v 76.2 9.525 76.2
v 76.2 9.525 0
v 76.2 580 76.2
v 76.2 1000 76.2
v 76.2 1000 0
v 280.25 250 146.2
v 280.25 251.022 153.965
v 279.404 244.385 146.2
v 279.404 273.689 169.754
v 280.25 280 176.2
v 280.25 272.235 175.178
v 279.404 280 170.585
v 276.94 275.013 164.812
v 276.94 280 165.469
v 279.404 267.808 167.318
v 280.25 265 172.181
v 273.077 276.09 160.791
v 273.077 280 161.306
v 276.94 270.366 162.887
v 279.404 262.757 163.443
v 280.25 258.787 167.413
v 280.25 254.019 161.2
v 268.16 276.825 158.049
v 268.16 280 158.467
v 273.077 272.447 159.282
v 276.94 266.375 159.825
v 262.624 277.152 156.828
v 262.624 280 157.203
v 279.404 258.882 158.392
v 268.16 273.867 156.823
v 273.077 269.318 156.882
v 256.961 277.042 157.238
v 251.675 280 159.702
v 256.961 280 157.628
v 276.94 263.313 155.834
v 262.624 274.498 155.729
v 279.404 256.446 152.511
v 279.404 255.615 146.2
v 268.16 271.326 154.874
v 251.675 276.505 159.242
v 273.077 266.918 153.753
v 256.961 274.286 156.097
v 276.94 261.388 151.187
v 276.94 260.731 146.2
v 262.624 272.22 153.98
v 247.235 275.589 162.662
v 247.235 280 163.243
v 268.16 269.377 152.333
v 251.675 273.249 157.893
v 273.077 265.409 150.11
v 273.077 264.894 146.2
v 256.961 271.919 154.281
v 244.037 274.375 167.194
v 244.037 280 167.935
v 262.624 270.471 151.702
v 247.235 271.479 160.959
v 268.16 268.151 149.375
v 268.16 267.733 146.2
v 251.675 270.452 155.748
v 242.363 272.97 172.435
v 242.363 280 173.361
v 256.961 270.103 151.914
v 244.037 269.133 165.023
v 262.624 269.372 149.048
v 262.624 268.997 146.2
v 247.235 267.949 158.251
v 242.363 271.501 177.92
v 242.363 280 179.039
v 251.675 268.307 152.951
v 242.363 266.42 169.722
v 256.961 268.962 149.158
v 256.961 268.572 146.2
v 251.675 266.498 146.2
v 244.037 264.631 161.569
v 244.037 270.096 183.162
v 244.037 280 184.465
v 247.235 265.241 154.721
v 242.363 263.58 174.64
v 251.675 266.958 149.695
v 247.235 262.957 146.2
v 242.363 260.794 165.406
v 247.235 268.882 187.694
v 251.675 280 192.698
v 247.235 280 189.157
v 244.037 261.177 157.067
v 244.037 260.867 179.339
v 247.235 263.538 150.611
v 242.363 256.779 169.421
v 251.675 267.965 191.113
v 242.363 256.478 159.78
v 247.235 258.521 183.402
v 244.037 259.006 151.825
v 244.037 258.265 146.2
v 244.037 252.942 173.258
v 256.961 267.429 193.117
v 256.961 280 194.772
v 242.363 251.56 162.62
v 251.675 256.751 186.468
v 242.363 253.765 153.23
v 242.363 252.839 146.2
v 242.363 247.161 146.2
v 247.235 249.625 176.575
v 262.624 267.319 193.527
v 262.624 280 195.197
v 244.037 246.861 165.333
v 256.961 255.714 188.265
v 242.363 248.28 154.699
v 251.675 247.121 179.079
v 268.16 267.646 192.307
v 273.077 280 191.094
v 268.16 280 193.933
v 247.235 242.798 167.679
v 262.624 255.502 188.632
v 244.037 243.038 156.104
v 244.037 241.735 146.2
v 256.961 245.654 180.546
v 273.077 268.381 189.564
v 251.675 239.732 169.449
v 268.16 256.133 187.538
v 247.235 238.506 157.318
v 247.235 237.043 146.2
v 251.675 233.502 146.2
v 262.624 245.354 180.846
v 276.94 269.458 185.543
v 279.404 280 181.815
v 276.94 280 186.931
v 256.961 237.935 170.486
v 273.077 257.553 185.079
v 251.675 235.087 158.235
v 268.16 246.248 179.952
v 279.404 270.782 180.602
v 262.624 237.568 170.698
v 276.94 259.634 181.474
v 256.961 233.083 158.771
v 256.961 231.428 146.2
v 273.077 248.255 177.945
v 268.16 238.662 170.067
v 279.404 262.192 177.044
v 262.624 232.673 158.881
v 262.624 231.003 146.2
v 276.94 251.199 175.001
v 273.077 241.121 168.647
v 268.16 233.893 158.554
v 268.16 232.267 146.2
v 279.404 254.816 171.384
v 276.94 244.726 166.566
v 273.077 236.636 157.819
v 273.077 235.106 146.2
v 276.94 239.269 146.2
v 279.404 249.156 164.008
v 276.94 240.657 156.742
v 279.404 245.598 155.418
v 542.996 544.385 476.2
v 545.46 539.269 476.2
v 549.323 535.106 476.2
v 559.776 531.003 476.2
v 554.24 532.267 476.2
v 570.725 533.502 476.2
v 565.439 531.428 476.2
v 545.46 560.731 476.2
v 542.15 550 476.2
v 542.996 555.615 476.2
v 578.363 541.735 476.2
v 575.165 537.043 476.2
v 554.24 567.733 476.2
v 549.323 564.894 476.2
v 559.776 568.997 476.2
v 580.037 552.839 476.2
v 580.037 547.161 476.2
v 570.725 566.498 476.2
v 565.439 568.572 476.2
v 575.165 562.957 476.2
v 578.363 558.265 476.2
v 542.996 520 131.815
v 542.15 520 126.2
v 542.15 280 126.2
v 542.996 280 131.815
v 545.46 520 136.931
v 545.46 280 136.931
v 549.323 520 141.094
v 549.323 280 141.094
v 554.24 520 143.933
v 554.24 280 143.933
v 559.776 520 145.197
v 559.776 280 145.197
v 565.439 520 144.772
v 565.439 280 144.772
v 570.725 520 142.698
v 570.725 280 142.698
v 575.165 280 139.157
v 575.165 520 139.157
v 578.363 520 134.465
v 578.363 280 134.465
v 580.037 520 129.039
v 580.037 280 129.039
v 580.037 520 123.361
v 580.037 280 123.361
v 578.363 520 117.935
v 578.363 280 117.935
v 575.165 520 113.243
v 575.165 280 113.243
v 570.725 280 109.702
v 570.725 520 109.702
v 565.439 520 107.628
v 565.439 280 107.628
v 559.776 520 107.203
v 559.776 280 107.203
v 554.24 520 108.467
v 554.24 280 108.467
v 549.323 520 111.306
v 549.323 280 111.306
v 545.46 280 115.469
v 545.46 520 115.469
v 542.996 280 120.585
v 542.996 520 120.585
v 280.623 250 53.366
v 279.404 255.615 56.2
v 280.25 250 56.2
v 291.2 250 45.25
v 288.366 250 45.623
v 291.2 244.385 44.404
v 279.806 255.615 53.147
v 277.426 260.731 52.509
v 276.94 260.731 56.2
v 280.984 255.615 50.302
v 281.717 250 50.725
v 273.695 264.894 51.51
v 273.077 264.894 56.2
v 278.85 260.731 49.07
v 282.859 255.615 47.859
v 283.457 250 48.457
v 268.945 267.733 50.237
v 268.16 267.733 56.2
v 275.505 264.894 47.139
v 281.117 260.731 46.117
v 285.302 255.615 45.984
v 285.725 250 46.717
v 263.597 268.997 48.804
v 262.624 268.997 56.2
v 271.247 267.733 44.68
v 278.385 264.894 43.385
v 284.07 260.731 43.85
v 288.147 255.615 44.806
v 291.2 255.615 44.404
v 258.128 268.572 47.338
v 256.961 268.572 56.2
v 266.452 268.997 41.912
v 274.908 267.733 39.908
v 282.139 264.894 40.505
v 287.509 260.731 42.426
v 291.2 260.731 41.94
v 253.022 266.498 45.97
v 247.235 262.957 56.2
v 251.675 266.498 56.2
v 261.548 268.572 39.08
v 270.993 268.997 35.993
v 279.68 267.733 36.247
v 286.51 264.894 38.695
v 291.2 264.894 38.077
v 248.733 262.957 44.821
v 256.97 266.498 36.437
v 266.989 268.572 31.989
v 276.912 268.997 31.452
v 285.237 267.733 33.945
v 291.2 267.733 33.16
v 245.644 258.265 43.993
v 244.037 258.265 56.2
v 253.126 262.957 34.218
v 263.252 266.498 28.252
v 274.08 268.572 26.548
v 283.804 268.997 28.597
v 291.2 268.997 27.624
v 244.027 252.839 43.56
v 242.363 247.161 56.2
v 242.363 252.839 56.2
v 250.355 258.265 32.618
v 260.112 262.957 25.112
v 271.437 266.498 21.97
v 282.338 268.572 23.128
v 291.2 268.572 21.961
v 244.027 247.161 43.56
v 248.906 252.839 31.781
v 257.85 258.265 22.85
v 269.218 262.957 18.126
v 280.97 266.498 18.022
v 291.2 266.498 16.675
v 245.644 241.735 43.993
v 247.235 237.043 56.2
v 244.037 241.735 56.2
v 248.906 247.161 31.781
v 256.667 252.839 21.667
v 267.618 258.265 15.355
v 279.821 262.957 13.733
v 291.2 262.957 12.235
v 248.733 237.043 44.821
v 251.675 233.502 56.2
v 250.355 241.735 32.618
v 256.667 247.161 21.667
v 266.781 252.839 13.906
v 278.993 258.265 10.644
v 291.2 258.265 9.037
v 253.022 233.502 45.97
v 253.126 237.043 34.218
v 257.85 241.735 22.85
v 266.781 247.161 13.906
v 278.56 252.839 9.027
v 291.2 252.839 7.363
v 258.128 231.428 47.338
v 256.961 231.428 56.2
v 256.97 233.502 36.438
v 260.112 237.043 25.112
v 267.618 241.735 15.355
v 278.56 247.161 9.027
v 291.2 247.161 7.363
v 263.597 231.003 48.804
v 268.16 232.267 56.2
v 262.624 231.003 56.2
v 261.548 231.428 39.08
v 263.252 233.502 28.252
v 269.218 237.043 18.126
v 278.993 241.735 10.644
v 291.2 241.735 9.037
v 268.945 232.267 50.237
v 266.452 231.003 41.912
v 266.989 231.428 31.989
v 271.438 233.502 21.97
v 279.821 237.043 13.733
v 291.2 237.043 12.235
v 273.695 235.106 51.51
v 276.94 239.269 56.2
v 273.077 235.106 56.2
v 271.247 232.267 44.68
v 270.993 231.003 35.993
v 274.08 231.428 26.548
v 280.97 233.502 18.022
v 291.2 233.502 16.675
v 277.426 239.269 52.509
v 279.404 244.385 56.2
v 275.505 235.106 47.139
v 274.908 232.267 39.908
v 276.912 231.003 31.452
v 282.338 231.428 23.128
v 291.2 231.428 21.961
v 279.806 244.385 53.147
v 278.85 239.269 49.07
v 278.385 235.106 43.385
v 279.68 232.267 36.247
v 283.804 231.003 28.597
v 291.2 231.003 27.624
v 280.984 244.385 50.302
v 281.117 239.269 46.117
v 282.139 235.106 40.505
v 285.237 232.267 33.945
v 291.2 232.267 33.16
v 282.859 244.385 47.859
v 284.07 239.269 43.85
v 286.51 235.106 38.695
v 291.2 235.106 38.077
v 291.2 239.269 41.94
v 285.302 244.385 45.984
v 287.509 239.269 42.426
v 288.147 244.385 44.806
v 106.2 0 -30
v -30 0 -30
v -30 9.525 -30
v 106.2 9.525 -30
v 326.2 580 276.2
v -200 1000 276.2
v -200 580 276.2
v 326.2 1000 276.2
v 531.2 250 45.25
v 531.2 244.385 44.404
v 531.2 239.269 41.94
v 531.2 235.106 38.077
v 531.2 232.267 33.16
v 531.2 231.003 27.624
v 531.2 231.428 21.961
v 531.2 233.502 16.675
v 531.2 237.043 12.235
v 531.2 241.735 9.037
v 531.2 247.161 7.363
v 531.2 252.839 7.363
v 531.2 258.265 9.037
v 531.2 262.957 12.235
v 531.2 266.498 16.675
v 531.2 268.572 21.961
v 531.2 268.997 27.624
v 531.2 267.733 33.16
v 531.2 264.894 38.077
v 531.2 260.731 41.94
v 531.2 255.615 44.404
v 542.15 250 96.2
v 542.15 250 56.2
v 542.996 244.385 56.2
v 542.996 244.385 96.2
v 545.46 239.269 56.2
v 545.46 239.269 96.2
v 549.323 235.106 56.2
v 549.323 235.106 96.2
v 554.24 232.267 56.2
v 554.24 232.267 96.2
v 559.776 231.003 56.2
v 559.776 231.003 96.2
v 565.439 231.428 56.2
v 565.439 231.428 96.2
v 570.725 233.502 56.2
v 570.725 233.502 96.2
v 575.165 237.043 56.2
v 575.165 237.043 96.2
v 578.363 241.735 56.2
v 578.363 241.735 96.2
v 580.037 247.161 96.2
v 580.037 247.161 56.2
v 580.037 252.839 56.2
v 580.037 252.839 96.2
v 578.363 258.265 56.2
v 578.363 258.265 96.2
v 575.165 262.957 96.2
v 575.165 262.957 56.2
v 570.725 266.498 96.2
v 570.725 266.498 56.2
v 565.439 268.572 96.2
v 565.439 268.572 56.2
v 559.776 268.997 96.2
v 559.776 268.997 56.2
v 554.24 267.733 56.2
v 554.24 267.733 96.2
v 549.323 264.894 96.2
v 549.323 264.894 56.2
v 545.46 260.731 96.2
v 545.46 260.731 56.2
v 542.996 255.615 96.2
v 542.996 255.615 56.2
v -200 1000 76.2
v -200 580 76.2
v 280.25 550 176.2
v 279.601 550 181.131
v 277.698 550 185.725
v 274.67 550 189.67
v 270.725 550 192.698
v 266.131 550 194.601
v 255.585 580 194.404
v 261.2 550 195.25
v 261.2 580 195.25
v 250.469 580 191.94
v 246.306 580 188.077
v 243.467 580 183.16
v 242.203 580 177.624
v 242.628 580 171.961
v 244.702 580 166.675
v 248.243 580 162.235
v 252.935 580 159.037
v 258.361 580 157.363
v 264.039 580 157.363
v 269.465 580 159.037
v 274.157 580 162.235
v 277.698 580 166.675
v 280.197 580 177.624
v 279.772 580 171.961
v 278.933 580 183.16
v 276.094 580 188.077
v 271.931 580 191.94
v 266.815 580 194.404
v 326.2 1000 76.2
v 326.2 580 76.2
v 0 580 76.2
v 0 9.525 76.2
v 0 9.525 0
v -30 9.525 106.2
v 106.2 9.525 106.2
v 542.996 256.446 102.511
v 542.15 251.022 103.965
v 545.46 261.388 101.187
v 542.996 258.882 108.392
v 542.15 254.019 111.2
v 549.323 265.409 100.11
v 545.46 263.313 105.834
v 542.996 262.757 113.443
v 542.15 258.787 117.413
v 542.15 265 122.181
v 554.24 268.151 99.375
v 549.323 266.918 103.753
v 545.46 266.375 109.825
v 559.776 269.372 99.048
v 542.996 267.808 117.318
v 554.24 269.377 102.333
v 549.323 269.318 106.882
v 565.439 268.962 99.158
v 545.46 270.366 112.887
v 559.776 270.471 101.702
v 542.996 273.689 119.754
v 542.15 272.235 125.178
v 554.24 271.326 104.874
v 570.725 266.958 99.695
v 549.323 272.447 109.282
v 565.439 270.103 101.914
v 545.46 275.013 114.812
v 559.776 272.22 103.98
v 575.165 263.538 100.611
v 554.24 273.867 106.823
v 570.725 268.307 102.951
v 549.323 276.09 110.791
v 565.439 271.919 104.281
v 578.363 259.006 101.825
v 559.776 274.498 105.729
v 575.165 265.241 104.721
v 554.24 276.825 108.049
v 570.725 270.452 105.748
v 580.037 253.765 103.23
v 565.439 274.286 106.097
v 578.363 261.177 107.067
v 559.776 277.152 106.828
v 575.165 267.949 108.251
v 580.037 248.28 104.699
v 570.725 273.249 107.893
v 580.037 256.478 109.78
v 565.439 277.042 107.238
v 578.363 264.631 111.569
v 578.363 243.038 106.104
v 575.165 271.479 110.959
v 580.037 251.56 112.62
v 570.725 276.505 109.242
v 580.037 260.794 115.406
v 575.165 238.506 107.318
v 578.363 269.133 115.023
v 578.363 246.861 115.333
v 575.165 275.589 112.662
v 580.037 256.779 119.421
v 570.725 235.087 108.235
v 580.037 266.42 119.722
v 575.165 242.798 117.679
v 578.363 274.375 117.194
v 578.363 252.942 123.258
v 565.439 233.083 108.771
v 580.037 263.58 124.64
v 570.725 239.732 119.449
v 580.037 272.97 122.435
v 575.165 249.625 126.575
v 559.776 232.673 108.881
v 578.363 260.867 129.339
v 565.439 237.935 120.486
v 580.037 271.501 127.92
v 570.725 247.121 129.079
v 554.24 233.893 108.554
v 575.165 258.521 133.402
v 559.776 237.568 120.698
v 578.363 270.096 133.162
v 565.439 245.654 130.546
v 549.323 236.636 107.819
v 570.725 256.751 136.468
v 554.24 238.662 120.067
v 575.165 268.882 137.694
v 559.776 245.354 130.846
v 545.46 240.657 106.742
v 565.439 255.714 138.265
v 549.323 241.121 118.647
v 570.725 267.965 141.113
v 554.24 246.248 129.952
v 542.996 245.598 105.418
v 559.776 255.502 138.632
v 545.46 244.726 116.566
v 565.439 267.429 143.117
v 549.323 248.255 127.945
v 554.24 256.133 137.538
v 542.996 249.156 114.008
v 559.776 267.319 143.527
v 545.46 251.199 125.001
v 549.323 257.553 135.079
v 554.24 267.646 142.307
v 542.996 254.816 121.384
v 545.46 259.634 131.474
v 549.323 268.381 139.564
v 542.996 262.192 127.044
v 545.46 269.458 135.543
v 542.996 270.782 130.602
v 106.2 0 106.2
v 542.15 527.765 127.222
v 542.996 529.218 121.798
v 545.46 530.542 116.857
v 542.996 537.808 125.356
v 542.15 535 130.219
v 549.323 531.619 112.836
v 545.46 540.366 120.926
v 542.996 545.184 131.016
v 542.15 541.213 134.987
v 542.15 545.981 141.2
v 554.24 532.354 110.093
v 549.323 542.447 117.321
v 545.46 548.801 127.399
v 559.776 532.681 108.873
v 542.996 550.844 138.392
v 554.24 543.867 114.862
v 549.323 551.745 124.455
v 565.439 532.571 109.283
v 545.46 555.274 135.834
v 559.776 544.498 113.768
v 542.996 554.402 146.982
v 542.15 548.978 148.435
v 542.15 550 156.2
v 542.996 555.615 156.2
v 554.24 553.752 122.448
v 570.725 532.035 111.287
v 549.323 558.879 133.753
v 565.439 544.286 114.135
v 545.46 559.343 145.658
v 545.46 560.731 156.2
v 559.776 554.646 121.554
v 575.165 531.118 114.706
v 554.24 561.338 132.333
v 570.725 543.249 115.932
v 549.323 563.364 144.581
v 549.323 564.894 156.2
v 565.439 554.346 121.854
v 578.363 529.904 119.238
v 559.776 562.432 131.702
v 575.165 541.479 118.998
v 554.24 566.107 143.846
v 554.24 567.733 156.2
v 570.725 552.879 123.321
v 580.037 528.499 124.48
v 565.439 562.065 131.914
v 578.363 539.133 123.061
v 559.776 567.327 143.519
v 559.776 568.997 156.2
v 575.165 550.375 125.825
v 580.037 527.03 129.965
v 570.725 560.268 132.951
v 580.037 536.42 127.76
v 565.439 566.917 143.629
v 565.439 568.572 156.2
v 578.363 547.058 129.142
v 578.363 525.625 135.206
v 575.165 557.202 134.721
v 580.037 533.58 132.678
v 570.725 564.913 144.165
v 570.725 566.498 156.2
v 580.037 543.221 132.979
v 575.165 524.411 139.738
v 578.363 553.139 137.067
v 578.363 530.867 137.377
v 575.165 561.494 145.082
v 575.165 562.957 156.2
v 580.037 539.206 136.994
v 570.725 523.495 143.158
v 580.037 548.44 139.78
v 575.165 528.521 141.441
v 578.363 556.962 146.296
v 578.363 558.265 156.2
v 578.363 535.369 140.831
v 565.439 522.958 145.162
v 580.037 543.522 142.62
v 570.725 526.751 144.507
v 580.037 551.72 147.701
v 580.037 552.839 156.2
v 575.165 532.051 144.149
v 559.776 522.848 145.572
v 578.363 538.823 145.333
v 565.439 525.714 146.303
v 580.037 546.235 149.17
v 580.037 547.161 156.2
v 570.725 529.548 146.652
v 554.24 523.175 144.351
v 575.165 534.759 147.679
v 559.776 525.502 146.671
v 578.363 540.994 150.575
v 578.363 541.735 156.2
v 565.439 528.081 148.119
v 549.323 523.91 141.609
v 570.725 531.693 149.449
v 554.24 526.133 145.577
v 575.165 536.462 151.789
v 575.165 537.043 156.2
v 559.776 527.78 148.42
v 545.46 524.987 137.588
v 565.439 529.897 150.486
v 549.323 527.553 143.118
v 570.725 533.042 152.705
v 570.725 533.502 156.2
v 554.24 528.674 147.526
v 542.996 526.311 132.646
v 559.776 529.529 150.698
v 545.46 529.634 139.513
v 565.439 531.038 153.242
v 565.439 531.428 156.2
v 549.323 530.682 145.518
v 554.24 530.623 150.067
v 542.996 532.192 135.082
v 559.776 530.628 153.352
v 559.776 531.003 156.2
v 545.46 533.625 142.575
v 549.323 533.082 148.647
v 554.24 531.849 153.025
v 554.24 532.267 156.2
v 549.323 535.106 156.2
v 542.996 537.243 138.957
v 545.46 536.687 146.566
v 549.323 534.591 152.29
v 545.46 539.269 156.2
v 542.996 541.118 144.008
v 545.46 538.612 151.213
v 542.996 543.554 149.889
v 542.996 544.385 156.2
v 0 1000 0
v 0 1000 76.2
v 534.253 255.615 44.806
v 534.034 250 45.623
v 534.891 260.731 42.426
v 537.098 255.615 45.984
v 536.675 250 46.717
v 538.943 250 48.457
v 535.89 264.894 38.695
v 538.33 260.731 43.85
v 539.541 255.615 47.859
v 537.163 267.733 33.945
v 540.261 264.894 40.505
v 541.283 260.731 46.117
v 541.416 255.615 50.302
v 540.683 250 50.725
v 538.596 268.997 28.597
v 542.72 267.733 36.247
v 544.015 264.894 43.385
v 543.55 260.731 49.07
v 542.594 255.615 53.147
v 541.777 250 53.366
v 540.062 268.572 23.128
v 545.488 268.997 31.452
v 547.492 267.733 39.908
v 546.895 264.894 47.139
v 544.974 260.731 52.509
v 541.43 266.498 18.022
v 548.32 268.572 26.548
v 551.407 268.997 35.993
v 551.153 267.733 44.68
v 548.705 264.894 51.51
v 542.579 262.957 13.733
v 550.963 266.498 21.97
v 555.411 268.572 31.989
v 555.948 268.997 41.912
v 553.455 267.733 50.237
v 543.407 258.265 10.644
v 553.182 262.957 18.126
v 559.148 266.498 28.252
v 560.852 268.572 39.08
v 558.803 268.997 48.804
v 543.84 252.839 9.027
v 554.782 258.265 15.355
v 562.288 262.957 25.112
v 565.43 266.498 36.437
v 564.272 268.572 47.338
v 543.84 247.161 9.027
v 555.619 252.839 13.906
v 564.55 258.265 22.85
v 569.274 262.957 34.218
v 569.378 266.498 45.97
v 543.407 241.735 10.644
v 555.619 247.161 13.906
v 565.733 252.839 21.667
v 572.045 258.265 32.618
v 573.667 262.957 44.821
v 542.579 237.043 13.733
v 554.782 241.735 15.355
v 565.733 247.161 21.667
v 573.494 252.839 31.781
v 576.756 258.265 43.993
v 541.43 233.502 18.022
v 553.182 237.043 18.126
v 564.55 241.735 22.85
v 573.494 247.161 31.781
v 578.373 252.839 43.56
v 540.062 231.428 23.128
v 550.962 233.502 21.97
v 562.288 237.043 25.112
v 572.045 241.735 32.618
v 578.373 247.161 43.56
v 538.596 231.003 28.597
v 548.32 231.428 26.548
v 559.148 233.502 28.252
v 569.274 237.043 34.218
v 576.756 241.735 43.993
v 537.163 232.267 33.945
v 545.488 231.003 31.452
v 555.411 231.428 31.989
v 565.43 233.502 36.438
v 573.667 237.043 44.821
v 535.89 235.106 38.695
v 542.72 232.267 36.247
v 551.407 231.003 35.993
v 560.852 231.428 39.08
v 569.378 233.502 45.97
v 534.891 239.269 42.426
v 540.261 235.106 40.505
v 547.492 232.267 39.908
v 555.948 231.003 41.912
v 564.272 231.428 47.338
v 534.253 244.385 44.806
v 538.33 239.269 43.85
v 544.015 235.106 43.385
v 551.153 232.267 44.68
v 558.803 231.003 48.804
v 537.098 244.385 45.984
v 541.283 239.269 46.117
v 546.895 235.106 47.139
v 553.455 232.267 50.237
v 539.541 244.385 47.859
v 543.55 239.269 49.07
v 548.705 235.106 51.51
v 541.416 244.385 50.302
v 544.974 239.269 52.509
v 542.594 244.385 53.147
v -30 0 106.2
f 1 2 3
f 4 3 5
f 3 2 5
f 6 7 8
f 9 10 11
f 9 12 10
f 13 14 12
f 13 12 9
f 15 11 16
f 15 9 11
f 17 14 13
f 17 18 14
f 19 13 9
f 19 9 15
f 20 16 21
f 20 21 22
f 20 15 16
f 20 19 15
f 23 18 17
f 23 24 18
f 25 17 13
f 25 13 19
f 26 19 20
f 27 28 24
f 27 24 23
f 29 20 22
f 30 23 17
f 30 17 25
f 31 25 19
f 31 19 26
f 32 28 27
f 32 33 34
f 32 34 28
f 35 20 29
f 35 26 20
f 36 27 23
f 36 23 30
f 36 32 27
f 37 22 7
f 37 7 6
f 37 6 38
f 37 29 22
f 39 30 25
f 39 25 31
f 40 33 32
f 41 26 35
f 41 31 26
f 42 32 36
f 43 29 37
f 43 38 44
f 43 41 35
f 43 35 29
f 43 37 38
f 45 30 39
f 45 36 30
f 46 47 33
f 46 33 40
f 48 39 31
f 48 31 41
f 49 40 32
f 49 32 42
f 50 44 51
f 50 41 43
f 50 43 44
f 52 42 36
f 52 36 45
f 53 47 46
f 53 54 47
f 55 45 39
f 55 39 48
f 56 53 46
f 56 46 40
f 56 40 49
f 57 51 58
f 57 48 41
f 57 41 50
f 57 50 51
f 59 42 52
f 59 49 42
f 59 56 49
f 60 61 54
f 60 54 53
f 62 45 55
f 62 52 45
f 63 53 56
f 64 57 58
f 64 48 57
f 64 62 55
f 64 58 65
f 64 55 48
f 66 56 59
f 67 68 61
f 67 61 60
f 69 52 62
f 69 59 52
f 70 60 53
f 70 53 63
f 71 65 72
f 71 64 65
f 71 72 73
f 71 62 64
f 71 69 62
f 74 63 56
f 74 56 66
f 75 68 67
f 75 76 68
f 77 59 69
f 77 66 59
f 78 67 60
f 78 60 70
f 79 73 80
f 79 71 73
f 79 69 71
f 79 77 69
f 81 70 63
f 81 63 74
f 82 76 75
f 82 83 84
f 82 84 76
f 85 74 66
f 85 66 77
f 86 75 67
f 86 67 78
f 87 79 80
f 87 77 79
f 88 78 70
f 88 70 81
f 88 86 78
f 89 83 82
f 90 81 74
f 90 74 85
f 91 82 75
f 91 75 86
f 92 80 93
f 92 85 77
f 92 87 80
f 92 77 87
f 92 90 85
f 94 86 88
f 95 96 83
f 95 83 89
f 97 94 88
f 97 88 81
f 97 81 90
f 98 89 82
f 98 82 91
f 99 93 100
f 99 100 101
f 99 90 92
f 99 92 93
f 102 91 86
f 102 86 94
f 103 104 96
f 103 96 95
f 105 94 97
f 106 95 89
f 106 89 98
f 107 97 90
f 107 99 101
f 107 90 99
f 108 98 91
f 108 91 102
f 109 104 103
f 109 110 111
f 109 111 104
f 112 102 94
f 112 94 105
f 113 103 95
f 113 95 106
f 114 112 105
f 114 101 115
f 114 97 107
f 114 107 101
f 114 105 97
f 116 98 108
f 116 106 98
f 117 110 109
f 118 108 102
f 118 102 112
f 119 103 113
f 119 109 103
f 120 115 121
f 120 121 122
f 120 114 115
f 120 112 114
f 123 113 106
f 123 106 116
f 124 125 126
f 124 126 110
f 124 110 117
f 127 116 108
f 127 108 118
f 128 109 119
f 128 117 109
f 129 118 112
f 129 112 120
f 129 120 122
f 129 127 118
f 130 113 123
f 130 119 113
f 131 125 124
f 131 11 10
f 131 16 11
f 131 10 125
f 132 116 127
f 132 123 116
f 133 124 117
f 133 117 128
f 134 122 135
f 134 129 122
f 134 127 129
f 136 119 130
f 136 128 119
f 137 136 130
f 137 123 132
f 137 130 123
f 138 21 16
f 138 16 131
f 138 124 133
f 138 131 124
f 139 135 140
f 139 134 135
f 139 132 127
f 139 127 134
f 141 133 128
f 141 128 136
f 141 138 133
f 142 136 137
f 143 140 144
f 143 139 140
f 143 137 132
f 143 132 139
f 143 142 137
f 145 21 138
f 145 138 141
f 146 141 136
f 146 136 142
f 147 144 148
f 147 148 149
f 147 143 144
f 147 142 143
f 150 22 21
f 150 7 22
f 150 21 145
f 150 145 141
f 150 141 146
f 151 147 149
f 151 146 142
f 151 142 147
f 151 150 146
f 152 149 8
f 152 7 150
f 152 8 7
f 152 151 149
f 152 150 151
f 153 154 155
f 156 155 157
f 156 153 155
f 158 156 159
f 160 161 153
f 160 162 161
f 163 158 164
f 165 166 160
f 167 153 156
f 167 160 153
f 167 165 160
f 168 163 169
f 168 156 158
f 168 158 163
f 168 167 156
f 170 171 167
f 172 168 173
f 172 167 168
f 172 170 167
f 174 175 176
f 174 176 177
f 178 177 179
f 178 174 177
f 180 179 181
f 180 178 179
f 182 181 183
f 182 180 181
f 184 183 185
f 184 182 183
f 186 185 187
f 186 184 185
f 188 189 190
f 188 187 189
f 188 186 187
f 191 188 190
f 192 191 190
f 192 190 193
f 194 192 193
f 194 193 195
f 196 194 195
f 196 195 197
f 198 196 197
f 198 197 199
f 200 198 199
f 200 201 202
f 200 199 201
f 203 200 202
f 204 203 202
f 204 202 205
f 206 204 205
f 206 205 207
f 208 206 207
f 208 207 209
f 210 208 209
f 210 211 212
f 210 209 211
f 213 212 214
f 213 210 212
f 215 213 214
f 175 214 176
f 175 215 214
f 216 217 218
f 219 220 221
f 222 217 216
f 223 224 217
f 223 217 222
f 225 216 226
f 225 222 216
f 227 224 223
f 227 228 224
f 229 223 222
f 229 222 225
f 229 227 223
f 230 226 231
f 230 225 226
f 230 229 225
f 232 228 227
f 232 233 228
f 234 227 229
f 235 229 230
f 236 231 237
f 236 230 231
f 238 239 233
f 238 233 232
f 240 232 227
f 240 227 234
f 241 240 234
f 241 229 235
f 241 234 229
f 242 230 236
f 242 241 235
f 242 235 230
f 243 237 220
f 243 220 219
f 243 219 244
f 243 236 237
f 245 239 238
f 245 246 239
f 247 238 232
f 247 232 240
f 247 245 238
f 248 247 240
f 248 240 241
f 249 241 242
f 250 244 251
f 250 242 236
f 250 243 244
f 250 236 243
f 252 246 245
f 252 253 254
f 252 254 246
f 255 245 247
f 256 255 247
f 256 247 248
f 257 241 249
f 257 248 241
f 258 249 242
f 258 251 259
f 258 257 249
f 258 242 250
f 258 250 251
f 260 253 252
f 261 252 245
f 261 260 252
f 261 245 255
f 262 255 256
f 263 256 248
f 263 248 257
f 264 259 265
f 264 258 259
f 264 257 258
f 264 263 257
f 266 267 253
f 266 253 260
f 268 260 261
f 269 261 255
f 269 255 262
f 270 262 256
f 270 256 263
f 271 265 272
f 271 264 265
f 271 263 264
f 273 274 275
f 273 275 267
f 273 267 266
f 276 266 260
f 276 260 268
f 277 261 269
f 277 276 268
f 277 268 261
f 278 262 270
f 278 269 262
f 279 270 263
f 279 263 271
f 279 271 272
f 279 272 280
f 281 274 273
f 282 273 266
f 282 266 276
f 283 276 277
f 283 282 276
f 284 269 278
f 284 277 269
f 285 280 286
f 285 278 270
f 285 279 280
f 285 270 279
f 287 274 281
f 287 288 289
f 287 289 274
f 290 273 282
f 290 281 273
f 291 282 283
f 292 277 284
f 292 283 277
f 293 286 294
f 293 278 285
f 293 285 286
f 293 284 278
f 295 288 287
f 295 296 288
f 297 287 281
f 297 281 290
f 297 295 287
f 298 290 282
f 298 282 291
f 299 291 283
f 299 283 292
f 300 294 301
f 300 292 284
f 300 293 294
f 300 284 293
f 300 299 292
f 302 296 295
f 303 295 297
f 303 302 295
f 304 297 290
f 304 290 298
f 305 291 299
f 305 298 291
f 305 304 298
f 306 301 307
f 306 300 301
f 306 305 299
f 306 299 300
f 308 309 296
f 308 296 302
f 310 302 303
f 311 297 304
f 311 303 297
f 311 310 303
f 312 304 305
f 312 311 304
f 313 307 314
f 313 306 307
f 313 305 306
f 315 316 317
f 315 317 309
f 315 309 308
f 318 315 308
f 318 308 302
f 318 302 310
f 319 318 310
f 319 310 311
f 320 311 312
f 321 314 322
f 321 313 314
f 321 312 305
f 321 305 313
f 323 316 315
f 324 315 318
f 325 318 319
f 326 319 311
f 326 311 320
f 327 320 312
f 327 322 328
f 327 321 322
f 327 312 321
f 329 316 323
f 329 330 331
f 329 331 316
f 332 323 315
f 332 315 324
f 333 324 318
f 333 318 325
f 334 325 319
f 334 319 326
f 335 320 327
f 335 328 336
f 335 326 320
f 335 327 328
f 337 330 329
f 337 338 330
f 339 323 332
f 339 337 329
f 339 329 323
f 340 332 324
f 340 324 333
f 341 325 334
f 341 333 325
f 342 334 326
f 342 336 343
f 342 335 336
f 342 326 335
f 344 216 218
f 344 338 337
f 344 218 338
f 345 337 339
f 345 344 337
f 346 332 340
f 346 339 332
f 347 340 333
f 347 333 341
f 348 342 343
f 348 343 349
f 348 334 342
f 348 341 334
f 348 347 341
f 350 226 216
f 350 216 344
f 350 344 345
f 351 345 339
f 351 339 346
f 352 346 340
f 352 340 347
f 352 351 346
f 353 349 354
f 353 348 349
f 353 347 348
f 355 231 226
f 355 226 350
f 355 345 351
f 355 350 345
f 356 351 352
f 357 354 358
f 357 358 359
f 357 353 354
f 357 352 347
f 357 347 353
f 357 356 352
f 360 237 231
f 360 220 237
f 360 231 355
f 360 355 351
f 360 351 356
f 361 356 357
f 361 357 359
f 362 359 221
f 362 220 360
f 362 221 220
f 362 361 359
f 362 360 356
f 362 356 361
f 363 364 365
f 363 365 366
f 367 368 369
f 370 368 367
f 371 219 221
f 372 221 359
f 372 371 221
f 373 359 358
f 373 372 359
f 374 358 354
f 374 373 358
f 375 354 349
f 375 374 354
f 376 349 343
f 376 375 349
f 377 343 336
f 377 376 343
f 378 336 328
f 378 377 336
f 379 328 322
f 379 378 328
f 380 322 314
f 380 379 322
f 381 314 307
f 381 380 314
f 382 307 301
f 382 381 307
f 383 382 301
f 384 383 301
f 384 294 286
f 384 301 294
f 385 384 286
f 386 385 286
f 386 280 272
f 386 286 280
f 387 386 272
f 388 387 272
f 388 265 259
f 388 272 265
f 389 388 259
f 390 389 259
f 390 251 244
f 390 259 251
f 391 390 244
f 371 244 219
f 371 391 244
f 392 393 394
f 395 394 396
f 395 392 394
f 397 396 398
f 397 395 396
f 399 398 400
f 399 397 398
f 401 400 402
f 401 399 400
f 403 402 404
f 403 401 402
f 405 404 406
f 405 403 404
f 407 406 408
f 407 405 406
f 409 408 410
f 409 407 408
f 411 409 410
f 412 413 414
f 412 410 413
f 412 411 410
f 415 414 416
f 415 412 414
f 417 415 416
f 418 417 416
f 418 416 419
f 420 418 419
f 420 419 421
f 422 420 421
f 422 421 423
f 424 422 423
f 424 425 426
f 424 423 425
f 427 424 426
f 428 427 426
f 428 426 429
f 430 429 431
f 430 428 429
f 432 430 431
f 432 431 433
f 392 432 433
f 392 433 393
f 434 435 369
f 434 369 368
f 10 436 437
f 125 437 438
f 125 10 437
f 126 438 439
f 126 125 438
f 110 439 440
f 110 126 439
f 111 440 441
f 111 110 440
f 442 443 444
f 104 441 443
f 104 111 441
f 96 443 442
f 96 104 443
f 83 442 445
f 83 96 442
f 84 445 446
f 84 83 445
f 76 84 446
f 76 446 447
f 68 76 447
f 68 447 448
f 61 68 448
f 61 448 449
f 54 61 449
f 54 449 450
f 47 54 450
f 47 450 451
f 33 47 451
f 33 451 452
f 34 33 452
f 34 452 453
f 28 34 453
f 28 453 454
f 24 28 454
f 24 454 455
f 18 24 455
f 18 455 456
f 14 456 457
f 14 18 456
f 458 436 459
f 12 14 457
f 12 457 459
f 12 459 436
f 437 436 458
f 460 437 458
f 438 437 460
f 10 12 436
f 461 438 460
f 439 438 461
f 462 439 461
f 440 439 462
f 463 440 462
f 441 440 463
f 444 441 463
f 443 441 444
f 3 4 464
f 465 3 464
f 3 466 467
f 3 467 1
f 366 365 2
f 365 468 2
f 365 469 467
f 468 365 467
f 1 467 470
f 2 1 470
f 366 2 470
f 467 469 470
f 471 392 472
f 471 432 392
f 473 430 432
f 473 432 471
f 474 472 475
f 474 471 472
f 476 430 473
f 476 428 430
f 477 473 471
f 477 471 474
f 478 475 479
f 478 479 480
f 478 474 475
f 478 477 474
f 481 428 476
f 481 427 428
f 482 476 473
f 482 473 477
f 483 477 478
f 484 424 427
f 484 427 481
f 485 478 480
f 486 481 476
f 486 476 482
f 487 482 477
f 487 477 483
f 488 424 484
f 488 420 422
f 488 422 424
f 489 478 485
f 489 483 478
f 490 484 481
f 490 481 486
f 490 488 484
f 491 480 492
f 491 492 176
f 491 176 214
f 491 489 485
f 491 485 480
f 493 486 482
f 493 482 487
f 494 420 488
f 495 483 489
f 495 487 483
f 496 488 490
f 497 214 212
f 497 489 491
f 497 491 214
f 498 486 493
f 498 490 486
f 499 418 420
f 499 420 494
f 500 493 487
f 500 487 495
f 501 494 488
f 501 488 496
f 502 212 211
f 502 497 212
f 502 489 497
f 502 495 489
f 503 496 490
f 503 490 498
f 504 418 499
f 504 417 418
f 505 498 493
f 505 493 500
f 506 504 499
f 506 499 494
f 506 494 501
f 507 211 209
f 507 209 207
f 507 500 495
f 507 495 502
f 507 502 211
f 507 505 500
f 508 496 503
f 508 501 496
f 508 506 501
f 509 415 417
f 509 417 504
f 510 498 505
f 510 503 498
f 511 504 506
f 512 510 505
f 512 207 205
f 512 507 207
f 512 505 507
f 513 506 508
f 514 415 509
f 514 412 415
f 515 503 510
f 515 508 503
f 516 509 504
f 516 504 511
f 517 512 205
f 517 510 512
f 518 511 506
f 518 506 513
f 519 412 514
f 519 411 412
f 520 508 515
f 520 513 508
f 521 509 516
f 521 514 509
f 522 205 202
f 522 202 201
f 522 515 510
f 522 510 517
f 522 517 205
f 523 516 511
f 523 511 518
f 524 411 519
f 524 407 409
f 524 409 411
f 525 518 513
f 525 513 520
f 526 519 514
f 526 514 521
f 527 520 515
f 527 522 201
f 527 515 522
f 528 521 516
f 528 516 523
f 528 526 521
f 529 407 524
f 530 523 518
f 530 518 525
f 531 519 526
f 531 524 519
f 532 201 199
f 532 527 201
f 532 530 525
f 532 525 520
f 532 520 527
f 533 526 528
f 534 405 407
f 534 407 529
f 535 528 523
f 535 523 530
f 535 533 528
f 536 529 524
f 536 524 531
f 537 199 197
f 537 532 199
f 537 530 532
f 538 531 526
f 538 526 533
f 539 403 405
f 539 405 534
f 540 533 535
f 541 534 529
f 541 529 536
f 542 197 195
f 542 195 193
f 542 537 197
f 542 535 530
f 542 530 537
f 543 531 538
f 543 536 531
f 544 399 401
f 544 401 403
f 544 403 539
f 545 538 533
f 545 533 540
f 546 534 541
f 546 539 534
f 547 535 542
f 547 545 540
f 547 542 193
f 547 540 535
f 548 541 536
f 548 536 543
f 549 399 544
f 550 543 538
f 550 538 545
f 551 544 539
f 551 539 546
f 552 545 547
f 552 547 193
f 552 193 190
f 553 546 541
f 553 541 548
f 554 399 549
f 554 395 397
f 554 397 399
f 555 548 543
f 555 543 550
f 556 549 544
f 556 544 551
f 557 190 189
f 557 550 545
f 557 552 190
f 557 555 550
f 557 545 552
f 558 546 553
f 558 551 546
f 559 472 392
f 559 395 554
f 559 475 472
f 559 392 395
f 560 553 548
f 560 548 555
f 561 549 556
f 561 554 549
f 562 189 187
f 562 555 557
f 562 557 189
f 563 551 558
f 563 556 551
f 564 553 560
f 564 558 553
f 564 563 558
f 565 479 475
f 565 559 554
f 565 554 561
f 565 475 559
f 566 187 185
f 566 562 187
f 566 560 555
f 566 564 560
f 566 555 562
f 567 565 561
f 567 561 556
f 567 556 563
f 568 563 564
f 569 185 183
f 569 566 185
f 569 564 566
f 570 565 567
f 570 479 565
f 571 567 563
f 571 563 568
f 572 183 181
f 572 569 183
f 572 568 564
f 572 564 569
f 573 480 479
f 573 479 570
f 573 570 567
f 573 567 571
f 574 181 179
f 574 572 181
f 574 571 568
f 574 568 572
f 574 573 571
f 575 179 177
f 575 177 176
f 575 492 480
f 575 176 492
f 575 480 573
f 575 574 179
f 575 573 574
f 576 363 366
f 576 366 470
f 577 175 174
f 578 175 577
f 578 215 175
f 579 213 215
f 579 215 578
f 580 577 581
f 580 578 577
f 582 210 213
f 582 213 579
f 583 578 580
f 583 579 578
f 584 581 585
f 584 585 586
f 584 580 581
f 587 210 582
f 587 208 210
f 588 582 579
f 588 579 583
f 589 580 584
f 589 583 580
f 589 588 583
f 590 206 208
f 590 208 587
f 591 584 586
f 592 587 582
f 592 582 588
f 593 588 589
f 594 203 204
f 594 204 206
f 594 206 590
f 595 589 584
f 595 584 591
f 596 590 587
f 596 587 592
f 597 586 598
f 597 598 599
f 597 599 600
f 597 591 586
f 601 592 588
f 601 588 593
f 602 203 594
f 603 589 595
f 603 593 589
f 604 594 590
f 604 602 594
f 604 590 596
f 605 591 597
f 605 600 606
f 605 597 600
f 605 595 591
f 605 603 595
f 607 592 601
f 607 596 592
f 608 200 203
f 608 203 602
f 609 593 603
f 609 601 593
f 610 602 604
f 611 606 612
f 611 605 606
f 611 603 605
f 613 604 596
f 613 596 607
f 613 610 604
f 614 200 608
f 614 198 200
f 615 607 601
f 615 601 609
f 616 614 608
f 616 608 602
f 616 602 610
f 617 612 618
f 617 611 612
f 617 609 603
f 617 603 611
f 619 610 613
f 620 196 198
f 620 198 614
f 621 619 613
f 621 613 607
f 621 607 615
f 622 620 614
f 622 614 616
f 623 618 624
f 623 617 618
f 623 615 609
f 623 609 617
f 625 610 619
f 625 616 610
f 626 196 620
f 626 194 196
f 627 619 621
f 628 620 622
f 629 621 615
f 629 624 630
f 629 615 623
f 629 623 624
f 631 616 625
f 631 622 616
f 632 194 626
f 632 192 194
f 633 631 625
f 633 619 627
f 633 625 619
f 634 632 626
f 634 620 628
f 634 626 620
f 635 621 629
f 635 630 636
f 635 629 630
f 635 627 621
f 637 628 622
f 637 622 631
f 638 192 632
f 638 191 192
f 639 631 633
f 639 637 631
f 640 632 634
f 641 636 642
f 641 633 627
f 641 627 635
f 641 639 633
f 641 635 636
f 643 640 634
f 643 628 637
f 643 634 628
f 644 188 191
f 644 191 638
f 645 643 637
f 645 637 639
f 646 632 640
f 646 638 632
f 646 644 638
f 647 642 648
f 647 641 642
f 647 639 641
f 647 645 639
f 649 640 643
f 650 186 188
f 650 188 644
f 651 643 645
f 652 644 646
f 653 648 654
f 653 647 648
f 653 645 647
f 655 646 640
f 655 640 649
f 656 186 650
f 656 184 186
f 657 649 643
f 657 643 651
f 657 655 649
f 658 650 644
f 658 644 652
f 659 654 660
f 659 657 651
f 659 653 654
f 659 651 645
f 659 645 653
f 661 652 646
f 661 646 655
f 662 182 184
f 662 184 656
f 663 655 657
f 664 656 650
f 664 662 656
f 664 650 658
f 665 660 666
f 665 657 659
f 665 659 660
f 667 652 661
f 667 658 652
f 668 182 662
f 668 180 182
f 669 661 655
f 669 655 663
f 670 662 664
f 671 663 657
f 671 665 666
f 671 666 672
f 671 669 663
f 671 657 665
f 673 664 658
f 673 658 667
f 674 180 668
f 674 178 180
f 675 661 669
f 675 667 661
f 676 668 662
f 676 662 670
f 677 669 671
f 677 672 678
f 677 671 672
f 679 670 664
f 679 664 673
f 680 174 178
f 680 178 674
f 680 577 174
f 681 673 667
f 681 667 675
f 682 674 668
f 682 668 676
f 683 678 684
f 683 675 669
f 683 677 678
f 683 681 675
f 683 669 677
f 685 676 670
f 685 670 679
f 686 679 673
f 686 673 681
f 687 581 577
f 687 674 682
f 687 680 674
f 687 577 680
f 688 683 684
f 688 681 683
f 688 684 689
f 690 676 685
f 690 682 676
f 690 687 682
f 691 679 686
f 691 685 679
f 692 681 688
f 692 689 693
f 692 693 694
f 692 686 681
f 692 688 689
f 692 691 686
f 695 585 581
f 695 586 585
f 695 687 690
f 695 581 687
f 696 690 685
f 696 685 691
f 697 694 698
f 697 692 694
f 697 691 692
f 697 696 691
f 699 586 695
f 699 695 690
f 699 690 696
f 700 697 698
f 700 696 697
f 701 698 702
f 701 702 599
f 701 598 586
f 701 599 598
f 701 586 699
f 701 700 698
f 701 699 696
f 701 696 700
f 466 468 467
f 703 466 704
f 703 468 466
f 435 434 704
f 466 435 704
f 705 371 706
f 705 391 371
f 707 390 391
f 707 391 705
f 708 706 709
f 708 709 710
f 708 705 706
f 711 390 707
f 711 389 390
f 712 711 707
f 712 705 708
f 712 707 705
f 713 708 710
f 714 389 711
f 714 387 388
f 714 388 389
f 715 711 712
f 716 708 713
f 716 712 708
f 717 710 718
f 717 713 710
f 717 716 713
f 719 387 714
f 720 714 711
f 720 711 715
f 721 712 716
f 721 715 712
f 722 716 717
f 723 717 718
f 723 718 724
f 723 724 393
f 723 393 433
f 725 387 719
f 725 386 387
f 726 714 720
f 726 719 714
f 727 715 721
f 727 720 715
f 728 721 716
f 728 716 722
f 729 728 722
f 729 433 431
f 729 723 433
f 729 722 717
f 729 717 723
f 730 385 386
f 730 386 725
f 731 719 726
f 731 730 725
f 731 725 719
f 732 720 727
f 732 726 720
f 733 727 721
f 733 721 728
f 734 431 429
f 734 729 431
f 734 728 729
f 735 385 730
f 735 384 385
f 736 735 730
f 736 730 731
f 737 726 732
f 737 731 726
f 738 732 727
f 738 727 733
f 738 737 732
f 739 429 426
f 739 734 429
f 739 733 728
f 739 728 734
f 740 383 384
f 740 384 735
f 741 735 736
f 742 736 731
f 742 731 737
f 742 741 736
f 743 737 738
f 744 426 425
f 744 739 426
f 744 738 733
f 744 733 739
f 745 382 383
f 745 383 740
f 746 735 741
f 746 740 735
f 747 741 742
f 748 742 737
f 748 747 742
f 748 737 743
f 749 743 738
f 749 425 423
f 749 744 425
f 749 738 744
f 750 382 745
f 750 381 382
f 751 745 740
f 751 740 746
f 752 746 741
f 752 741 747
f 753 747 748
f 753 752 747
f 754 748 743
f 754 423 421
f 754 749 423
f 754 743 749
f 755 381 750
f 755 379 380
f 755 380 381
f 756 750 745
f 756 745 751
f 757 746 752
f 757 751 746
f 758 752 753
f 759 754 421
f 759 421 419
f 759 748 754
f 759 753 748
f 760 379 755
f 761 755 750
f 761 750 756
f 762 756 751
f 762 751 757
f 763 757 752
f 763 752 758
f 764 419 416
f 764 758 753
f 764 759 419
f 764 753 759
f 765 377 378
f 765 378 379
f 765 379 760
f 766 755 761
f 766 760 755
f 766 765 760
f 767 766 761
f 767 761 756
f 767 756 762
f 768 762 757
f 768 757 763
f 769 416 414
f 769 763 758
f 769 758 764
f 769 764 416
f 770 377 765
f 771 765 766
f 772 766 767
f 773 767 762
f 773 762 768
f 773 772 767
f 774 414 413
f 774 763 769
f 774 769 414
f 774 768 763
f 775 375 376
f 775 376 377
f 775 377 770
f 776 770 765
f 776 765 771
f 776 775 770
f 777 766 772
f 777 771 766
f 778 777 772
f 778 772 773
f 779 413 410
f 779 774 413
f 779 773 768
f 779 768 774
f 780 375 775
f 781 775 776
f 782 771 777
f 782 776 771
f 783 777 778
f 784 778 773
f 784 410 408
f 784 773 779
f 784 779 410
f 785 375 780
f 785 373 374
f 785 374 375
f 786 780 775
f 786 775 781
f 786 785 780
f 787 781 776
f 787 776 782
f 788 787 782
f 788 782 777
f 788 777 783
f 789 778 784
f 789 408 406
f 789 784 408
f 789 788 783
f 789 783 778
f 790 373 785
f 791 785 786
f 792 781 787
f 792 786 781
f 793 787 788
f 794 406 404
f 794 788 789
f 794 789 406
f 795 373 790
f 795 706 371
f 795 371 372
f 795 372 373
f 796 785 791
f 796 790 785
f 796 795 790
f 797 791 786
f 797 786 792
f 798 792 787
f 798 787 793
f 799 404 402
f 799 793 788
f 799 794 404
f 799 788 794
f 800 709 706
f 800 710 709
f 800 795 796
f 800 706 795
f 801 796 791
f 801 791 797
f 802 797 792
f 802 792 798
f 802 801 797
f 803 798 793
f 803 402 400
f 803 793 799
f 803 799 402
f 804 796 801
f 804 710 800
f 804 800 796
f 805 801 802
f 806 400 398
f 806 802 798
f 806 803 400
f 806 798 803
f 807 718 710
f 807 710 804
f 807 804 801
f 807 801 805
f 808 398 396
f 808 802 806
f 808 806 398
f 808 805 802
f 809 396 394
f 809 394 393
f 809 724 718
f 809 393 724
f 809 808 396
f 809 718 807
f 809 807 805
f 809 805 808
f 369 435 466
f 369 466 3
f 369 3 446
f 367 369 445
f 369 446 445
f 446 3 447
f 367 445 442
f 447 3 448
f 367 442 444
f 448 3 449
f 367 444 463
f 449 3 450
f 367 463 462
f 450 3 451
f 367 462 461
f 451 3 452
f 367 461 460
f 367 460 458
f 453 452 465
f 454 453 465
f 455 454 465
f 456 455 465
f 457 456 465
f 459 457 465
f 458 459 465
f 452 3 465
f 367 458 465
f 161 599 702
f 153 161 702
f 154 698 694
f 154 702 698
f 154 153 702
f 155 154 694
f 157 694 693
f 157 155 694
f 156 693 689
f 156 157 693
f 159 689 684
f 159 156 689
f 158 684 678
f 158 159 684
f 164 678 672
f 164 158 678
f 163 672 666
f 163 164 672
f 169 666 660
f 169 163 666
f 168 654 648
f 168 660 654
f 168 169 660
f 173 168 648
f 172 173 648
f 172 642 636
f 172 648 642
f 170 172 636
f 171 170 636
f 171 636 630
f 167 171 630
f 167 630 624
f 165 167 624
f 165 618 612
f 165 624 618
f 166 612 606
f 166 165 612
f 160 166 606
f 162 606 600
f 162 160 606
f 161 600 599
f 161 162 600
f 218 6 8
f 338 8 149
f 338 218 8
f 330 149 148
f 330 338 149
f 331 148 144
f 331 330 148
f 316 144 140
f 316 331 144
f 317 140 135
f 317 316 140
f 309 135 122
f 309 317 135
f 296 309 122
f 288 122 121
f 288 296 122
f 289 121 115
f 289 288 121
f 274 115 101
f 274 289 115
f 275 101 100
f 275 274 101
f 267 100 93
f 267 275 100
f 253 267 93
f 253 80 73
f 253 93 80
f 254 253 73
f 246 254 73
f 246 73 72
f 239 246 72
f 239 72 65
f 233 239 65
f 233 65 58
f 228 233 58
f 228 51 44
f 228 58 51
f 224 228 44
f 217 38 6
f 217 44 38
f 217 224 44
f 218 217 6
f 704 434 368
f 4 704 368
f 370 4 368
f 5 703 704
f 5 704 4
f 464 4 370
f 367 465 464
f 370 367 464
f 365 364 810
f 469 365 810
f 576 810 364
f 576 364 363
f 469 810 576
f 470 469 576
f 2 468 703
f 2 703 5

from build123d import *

# Parameters (mm, degrees)
CROQUIS1_W              = 76.2
CROQUIS1_H              = 1000
SALIENTE_EXTRUIR1_DEPTH = 76.2
CROQUIS2_W              = 136.2
CROQUIS2_H              = 136.2
SALIENTE_EXTRUIR2_DEPTH = 9.525
CROQUIS3_W              = 526.2
CROQUIS3_H              = 420
SALIENTE_EXTRUIR3_DEPTH = 200
CROQUIS4_R              = 19.05
SALIENTE_EXTRUIR4_DEPTH = 30
CROQUIS5_R              = 19.05


with BuildPart() as part:
    # Croquis1 → Saliente-Extruir1 (new body)
    with BuildSketch(Plane.XY):
        with Locations((38.1, 500)):
            Rectangle(CROQUIS1_W, CROQUIS1_H)
    extrude(amount=SALIENTE_EXTRUIR1_DEPTH)

    # Croquis2 → Saliente-Extruir2 (add)
    with BuildSketch(Plane.XZ):
        with Locations((38.1, 38.1)):
            Rectangle(CROQUIS2_W, CROQUIS2_H)
    extrude(amount=-SALIENTE_EXTRUIR2_DEPTH)

    # Croquis3 → Saliente-Extruir3 (add)
    with BuildSketch(Plane.XY.offset(76.2)):
        with Locations((63.1, 790)):
            Rectangle(CROQUIS3_W, CROQUIS3_H)
    extrude(amount=SALIENTE_EXTRUIR3_DEPTH)

    # Croquis4 → Saliente-Extruir4 (add)
    with BuildSketch(Plane.XZ.offset(-580)):
        with Locations(Location((261.2, 176.2, 0), (0, 0, 90))):
            Circle(CROQUIS4_R)
    extrude(amount=SALIENTE_EXTRUIR4_DEPTH)

    # Barrer1: sweep along a curve in space
    with BuildLine() as barrer1_path:
        Line((261.2, 550, 176.2), (261.2, 280, 176.2))
        ThreePointArc((261.2, 280, 176.2), (261.2, 258.786796564, 167.413203436), (261.2, 250, 146.2))
        Line((261.2, 250, 146.2), (261.2, 250, 56.2))
        ThreePointArc((261.2, 250, 56.2), (269.986796564, 250, 34.986796564), (291.2, 250, 26.2))
        Line((291.2, 250, 26.2), (531.2, 250, 26.2))
        ThreePointArc((531.2, 250, 26.2), (552.413203436, 250, 34.986796564), (561.2, 250, 56.2))
        Line((561.2, 250, 56.2), (561.2, 250, 96.2))
        ThreePointArc((561.2, 250, 96.2), (561.2, 258.786796564, 117.413203436), (561.2, 280, 126.2))
        Line((561.2, 280, 126.2), (561.2, 520, 126.2))
        ThreePointArc((561.2, 520, 126.2), (561.2, 541.213203436, 134.986796564), (561.2, 550, 156.2))
        Line((561.2, 550, 156.2), (561.2, 550, 476.2))
    # Croquis5 → Barrer1 (sweep)
    with BuildSketch(Plane.XZ.offset(-550)):
        with Locations((261.2, 176.2)):
            Circle(CROQUIS5_R)
    sweep(path=barrer1_path.line)


solid = part.part
